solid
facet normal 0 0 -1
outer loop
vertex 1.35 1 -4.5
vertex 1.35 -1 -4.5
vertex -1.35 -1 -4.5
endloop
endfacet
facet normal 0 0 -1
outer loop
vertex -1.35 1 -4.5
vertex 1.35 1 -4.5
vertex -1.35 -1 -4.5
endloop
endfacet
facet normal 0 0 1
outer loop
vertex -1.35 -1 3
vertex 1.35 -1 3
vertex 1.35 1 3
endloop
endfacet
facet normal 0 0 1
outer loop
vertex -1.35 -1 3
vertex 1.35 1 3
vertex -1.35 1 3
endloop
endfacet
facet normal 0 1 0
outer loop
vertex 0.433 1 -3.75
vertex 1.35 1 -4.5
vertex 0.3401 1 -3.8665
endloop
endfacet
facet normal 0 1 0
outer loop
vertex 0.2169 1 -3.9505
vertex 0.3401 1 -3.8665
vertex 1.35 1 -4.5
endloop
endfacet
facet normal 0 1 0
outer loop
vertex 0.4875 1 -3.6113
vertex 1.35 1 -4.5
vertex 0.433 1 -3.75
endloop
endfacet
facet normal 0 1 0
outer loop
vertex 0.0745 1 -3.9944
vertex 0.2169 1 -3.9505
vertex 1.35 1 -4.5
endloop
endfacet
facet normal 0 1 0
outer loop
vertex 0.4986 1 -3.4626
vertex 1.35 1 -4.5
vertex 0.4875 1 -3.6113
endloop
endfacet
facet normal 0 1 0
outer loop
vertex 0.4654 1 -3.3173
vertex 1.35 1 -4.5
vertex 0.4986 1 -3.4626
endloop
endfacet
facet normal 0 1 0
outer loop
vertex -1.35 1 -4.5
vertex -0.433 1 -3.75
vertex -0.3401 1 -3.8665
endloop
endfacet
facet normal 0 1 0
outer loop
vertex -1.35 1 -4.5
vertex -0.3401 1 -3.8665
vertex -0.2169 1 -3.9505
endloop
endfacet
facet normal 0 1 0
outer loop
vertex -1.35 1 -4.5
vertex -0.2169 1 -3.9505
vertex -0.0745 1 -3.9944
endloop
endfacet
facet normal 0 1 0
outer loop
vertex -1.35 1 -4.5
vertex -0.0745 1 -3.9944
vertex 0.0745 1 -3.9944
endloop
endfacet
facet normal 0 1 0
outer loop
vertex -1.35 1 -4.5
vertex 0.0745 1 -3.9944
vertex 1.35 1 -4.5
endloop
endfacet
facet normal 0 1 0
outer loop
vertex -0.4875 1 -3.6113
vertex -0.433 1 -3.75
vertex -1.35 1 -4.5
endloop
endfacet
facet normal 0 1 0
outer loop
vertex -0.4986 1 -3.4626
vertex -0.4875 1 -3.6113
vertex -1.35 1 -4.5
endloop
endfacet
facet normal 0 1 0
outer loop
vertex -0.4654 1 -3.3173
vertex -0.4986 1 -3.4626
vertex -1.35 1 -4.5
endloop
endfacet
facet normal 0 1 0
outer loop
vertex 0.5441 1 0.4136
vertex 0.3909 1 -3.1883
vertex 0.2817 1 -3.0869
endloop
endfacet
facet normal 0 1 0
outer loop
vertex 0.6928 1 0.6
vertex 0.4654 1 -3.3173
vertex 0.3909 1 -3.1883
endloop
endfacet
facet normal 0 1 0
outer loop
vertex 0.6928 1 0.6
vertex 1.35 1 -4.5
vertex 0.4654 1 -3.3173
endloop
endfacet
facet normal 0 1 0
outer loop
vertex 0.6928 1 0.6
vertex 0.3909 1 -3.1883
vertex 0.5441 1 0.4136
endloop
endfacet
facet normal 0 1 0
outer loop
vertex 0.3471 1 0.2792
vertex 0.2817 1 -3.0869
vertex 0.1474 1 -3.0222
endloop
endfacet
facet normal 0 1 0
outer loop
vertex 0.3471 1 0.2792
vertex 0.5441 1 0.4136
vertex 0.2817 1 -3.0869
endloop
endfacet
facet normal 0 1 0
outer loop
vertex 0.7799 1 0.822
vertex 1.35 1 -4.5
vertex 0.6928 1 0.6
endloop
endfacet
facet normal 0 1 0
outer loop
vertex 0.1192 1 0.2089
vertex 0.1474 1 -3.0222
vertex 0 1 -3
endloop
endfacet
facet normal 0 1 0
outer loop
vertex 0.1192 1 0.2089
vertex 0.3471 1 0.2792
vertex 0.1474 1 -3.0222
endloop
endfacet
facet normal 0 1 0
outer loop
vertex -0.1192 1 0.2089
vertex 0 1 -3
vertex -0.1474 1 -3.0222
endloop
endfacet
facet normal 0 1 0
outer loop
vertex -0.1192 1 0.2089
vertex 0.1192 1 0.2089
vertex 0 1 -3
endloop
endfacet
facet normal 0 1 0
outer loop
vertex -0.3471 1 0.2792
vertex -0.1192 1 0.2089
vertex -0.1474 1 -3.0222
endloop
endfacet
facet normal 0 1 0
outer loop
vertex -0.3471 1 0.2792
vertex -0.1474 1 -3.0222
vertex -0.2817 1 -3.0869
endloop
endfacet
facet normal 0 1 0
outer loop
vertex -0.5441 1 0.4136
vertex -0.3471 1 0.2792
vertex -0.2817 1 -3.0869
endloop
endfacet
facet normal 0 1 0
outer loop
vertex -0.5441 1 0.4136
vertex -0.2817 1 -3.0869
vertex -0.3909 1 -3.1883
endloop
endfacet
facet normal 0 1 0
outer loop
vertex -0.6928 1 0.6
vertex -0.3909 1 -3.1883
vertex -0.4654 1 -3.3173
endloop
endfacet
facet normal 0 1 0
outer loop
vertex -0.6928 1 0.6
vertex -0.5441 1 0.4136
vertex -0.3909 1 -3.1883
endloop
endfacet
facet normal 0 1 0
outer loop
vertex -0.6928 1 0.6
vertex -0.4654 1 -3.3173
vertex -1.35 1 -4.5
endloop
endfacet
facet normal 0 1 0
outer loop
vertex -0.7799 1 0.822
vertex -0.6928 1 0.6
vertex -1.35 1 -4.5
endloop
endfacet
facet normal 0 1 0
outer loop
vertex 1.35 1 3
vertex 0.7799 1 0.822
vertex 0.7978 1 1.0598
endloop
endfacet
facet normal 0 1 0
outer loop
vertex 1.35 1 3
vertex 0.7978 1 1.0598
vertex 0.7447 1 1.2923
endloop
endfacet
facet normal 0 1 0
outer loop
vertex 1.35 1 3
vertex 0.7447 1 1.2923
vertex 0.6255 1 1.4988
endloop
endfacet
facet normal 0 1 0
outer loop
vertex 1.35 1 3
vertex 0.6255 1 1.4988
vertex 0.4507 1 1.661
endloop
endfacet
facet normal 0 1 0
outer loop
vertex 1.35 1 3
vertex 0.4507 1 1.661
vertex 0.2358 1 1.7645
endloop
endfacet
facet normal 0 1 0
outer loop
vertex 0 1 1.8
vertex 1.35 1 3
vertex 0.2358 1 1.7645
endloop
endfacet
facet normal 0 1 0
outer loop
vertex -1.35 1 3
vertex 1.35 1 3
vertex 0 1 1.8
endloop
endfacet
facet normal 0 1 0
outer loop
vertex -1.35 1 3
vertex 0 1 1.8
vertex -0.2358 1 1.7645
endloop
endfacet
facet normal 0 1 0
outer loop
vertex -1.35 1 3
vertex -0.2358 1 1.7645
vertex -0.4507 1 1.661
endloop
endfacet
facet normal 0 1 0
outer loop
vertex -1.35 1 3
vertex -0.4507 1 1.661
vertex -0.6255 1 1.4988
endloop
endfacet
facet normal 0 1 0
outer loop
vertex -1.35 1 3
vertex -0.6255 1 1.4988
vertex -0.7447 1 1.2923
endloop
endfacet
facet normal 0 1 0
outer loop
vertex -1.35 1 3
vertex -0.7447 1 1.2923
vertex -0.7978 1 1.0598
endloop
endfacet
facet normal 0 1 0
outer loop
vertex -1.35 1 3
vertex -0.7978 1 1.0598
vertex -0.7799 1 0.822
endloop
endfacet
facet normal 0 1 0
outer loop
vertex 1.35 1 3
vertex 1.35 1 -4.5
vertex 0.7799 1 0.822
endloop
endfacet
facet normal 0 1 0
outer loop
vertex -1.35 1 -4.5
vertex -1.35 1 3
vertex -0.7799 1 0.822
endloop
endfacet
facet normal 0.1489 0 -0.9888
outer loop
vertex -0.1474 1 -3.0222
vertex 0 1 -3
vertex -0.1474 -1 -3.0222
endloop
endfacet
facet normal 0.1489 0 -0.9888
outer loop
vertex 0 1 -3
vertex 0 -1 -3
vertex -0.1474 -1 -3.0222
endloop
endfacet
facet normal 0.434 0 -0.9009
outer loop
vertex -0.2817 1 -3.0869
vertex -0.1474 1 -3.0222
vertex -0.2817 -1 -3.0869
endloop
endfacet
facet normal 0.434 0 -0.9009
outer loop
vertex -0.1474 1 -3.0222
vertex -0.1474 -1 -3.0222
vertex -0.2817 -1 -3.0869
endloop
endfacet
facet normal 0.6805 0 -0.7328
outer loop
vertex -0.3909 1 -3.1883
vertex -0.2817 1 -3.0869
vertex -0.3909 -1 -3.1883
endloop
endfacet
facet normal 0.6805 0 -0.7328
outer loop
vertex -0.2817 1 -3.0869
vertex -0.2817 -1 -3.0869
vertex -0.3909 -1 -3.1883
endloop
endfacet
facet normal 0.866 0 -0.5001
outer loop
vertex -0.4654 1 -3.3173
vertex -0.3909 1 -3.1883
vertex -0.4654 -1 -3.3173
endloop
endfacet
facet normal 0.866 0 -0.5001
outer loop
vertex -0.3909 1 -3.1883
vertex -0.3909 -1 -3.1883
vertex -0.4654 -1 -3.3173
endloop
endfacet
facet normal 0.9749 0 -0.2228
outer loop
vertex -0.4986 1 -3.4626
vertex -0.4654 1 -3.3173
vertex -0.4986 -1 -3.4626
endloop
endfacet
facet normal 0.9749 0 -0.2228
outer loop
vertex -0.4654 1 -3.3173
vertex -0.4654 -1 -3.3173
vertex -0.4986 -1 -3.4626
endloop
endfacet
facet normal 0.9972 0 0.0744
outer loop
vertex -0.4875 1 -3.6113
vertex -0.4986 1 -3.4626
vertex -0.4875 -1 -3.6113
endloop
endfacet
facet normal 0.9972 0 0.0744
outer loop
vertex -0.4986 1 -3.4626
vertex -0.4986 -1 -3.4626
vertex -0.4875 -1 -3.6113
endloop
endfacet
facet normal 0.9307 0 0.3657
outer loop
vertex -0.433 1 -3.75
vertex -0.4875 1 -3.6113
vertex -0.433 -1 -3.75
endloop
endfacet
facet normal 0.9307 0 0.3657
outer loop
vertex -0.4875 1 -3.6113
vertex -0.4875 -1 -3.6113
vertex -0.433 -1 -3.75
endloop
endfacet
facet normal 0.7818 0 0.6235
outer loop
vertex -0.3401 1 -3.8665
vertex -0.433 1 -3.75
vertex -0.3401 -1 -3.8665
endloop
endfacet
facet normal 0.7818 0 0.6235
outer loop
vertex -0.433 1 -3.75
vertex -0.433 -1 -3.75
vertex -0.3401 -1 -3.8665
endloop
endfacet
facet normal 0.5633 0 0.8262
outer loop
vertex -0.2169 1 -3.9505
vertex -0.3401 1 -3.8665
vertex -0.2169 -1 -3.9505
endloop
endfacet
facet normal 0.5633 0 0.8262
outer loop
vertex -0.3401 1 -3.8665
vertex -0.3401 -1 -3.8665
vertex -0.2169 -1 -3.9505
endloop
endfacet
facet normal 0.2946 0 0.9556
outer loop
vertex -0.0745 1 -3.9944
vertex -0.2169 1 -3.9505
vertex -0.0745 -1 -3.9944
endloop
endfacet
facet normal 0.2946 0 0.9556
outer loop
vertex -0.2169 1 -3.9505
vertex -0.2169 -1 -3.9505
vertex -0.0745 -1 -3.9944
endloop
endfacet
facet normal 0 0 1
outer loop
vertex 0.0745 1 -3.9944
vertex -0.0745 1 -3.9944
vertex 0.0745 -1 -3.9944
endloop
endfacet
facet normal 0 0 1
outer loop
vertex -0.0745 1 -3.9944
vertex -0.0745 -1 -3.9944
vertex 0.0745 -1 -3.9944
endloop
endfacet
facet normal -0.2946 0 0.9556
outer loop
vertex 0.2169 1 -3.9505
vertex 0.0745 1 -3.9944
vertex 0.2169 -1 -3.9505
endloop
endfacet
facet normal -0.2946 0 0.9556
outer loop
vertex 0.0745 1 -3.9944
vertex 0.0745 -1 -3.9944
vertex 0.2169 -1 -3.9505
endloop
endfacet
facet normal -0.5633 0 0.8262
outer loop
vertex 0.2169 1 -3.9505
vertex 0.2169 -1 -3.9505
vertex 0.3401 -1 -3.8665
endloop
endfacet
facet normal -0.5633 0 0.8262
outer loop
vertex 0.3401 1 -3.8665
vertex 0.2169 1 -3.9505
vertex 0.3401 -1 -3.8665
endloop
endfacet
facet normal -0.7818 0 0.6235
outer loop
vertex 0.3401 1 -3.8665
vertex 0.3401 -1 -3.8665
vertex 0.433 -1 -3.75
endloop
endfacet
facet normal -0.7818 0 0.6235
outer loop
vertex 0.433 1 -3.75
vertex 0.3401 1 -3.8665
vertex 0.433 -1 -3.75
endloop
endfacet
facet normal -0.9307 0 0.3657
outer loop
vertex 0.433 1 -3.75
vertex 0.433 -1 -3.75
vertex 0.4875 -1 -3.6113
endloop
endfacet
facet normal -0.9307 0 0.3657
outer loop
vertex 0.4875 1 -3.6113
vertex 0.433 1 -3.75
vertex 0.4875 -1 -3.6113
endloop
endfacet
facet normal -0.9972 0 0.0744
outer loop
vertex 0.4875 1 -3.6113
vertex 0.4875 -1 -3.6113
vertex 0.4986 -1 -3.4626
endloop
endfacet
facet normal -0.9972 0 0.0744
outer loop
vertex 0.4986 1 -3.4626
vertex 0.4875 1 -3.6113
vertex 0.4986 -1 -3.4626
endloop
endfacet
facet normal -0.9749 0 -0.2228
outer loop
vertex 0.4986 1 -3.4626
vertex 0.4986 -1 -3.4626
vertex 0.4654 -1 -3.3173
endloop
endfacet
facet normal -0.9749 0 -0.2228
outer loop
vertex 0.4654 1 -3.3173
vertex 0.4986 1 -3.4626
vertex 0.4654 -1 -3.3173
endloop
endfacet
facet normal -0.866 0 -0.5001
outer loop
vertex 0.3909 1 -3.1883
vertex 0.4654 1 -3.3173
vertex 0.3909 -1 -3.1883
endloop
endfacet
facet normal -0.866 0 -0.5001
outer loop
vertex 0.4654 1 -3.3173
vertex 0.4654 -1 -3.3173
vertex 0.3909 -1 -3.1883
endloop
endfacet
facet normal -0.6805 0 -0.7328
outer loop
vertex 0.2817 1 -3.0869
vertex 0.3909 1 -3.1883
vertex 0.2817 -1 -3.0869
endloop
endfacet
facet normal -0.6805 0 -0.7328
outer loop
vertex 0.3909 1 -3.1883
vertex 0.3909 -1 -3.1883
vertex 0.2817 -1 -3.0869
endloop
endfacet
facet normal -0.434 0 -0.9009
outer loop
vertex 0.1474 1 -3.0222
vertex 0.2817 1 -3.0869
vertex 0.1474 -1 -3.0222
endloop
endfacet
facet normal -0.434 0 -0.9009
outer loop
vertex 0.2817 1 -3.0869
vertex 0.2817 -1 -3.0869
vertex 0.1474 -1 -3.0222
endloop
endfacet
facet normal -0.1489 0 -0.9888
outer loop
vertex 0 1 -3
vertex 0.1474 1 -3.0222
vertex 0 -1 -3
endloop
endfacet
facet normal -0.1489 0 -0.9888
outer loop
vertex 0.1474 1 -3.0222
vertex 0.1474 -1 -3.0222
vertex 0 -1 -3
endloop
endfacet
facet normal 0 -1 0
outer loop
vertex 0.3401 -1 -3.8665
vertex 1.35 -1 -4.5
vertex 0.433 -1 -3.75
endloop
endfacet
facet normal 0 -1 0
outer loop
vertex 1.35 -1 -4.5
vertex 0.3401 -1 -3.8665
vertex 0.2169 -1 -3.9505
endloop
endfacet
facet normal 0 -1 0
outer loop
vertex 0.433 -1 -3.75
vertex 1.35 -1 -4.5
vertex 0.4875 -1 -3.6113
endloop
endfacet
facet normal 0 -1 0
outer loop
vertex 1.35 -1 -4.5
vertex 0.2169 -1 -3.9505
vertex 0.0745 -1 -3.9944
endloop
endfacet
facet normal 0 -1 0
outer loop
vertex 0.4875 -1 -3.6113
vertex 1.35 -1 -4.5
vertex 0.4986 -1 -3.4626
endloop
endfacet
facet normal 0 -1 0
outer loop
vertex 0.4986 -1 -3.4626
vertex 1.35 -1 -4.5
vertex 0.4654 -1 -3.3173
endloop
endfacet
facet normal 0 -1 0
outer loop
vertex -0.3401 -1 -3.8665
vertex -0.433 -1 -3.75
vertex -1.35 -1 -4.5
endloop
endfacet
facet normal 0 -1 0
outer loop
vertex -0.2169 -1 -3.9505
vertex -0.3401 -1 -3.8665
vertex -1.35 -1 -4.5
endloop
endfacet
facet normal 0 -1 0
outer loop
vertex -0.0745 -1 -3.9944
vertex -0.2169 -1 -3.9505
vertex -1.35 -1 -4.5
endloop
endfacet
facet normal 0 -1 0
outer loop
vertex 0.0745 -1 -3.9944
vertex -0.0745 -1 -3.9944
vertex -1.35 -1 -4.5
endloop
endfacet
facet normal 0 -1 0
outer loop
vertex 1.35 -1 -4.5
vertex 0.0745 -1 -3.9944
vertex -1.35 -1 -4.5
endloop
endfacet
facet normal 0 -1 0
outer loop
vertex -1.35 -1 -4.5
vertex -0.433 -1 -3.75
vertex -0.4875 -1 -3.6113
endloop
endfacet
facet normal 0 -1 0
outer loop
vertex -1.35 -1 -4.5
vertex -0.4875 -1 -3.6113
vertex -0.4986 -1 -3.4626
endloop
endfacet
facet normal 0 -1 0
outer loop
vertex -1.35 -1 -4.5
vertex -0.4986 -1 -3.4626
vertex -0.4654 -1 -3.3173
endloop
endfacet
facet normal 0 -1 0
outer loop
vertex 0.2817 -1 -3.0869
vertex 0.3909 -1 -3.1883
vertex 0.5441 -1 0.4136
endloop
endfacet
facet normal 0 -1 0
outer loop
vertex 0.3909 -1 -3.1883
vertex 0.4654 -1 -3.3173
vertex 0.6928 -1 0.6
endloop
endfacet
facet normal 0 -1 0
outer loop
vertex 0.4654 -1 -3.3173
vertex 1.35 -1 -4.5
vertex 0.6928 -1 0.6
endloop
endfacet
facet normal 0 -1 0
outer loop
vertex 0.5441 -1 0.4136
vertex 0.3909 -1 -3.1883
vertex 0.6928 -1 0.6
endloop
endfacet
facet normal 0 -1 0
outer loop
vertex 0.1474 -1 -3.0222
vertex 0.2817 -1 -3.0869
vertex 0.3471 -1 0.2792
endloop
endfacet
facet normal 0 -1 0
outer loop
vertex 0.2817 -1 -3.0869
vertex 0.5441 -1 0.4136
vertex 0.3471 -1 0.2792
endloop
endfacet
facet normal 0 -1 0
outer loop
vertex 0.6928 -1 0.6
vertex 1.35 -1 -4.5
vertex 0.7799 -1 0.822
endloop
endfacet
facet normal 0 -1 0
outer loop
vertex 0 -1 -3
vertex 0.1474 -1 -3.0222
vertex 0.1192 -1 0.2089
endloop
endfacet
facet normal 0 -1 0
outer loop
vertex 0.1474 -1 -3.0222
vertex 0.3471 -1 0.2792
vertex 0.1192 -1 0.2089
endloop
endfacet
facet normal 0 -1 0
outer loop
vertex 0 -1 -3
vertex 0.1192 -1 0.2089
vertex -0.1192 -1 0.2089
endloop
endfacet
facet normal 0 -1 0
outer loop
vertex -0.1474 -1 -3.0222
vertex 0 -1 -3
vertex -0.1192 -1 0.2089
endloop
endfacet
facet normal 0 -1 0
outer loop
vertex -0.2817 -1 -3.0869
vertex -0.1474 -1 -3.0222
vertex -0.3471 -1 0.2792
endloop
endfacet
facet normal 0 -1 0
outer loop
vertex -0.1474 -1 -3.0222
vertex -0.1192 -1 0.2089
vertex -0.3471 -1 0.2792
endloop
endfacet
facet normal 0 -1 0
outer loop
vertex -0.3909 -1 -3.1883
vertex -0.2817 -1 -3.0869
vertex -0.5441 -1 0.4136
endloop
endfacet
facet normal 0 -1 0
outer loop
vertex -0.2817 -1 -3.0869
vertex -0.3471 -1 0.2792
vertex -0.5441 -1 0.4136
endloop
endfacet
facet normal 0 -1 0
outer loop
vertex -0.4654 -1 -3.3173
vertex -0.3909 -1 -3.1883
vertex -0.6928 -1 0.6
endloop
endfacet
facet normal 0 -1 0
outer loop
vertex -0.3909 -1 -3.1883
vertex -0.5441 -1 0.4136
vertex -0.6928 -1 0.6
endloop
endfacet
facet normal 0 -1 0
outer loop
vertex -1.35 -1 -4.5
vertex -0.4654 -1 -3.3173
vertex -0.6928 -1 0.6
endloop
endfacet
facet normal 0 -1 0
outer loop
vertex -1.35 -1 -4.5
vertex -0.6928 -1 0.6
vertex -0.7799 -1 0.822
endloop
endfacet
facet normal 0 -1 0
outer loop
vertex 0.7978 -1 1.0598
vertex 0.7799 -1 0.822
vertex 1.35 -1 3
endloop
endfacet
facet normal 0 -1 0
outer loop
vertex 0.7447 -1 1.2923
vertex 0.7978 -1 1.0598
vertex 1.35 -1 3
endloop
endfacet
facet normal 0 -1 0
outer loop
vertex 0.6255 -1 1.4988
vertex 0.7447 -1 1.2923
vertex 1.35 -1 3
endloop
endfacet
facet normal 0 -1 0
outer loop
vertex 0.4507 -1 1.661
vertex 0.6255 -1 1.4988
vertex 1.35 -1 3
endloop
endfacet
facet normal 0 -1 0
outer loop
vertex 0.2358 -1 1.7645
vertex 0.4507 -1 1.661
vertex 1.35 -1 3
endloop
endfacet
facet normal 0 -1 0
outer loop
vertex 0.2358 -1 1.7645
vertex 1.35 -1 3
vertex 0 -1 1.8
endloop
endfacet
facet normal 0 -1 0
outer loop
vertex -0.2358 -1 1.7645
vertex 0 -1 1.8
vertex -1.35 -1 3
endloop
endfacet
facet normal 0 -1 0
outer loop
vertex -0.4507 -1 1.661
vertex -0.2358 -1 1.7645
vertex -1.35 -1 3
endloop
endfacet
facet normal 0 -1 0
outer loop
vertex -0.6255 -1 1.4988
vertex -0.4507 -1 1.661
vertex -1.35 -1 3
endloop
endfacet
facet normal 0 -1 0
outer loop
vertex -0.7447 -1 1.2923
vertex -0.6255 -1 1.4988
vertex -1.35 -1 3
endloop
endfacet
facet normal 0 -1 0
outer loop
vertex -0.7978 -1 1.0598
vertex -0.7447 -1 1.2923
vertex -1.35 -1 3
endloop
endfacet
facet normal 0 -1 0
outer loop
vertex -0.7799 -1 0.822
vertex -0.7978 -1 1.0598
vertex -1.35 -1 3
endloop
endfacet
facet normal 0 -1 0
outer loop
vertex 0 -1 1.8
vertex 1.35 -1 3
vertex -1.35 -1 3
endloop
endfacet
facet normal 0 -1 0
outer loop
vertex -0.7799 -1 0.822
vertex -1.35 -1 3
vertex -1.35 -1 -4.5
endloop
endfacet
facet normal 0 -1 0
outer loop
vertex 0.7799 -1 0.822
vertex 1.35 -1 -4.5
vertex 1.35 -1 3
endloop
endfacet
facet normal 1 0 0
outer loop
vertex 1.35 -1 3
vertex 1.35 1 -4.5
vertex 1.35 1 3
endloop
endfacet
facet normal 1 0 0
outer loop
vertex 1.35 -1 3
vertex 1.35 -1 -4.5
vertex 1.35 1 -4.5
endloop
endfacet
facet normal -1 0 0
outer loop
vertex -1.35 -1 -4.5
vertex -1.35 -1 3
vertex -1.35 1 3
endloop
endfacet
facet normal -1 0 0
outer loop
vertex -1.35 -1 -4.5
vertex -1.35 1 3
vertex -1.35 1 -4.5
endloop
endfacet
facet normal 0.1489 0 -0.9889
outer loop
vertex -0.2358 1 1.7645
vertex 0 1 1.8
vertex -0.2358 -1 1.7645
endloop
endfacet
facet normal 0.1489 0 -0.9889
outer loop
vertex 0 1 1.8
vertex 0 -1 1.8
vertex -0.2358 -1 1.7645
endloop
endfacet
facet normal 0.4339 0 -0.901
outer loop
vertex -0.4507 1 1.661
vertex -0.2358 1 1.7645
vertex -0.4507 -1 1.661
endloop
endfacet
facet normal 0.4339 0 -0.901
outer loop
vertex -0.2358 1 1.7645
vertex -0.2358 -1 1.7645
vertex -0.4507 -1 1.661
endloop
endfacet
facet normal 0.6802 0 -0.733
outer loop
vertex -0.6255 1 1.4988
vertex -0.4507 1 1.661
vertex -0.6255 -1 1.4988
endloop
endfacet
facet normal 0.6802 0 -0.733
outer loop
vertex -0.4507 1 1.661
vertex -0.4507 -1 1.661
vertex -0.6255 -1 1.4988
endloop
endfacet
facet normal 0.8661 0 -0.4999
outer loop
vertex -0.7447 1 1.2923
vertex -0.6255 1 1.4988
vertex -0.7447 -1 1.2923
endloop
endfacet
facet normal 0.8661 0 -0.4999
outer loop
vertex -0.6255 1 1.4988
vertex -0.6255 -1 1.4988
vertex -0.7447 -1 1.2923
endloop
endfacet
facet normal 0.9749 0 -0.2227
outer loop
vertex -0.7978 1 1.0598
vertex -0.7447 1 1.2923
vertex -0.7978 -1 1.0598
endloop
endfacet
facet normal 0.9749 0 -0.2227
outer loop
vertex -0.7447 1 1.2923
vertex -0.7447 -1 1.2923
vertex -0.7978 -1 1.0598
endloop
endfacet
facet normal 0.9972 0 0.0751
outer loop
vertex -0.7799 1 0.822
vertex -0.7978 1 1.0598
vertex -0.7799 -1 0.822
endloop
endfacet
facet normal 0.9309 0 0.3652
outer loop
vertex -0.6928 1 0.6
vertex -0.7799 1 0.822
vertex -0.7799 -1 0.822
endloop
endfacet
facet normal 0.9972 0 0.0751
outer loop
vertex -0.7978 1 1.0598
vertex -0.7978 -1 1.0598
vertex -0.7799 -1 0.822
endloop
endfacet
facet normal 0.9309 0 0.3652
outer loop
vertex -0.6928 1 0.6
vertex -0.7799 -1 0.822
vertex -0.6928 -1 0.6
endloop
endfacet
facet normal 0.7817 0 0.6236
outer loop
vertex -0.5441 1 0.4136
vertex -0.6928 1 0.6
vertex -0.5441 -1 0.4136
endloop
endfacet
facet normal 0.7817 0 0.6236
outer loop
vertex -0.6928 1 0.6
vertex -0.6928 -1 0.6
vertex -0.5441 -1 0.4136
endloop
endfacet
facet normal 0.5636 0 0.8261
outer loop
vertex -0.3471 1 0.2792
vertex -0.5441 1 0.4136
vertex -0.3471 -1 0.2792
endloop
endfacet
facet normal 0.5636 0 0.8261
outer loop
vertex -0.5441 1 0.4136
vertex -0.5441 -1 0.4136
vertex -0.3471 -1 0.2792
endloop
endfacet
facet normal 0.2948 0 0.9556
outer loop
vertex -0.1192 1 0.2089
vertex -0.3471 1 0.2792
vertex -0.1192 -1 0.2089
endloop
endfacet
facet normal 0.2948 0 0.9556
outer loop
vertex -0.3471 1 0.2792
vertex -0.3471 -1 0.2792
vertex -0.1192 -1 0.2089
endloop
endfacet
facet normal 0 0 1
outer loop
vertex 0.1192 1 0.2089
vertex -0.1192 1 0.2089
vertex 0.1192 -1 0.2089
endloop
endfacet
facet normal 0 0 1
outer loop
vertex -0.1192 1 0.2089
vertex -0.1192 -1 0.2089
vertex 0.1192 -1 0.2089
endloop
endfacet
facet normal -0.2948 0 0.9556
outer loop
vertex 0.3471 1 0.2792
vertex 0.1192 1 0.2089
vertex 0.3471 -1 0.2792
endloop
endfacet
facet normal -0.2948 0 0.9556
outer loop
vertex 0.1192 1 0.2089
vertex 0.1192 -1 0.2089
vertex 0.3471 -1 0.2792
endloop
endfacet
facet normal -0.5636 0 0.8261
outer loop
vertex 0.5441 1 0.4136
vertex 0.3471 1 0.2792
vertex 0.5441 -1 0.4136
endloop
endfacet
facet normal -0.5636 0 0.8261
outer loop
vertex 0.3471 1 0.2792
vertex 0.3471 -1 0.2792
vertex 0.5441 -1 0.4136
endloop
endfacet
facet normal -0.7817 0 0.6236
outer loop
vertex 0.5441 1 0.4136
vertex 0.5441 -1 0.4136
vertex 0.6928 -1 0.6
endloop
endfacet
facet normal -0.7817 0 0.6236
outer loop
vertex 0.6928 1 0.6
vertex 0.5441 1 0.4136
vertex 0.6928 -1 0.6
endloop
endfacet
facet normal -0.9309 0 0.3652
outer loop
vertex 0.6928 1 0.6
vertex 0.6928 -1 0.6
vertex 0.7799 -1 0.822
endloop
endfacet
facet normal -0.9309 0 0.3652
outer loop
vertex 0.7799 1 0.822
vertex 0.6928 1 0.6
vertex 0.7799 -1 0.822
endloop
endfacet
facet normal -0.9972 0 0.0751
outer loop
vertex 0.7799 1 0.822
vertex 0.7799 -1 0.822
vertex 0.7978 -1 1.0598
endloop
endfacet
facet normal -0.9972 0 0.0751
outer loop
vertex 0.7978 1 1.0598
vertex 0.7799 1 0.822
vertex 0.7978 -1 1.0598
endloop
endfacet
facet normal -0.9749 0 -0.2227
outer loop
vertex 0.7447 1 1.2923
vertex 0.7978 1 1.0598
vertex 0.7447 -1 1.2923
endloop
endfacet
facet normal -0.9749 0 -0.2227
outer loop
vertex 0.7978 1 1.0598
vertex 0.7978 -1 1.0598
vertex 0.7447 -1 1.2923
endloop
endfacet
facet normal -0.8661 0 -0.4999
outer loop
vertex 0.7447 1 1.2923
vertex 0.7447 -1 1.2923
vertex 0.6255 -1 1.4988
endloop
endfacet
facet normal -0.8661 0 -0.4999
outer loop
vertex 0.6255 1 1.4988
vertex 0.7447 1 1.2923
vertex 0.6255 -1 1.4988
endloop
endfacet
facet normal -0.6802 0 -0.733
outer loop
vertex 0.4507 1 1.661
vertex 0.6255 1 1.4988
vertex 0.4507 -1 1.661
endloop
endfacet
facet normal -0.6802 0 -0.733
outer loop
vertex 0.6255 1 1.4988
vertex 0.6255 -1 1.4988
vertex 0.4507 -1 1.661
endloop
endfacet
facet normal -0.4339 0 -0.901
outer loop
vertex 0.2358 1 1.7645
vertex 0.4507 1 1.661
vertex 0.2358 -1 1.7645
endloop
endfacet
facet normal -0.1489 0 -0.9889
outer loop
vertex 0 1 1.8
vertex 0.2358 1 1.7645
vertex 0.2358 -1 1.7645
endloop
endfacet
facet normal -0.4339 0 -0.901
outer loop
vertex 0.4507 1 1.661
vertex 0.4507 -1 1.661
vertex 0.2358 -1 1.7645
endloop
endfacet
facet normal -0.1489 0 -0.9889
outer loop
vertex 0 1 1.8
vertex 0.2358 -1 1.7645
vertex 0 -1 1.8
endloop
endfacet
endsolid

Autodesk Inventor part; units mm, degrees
ref_plane "YZ Plane" through (0, 0, 0) normal (1, 0, 0) x (0, 1, 0)
ref_plane "XZ Plane" through (0, 0, 0) normal (0, 1, 0) x (-1, 0, 0)
ref_plane "XY Plane" through (0, 0, 0) normal (0, 0, 1) x (1, 0, 0)
sketch "Sketch2" plane through (0, 0, 0) normal (0, 1, 0) x (-1, 0, 0)
  line L0 (1.35, 0) -> (1.35, -4.5)
  line L1 (-1.35, -1) -> (-1.35, 3)
  line L2 (-1.35, -4.5) -> (-1.35, 3)
  line L3 (-1.35, 3) -> (1.35, 3)
  line L4 (1.35, 3) -> (1.35, -4.5)
  line L5 (-1.35, -4.5) -> (1.35, -4.5)
  point P0 (0, 0)
  dimension "d8" = 1.35
  dimension "d11" = 4
  dimension "d24" = 7.5
  dimension "d62" = 2.7
  dimension "d63" = 2.7
extrude "Extrusion1" add sketch "Sketch2" along normal mid plane 2
sketch "Sketch6" plane through (0, 1, 0) normal (0, 1, 0) x (1, 0, 0)
  line L0 (0, -3) -> (0, -1)
  circle A0 centre (0, -1) radius 0.8
  line L1 (0, -1) -> (-1.35, -1)
  line L2 (-1.35, 4.5) -> (-1.35, -3) projected
  point P0 (0, 0)
  dimension "d40" = 2
  dimension "d41" = 1.6
  dimension "d64" = 1.35
hole "Hole3" at (0, 1, 1) direction (0, -1, 0) diameter 1.6 end through all
sketch "Sketch7" plane through (0, 1, 0) normal (0, 1, 0) x (1, 0, 0)
  line L0 (0, 4.5) -> (0, 3.5)
  circle A0 centre (0, 3.5) radius 0.5
  line L1 (0, 3.5) -> (0, -1)
  line L2 (0, 3.5) -> (0, 1)
  line L3 (0, 4.5) -> (0, 4)
  point P0 (0, 0)
  dimension "d50" = 1
  dimension "d49" = 1
  dimension "d51" = 4.5
  dimension "d52" = 2.5
  dimension "d53" = 0.5
hole "Hole4" at (0, 1, -3.5) direction (0, -1, 0) diameter 1 end through all
properties part number "Part3_slider" material "ABS Plastic"
